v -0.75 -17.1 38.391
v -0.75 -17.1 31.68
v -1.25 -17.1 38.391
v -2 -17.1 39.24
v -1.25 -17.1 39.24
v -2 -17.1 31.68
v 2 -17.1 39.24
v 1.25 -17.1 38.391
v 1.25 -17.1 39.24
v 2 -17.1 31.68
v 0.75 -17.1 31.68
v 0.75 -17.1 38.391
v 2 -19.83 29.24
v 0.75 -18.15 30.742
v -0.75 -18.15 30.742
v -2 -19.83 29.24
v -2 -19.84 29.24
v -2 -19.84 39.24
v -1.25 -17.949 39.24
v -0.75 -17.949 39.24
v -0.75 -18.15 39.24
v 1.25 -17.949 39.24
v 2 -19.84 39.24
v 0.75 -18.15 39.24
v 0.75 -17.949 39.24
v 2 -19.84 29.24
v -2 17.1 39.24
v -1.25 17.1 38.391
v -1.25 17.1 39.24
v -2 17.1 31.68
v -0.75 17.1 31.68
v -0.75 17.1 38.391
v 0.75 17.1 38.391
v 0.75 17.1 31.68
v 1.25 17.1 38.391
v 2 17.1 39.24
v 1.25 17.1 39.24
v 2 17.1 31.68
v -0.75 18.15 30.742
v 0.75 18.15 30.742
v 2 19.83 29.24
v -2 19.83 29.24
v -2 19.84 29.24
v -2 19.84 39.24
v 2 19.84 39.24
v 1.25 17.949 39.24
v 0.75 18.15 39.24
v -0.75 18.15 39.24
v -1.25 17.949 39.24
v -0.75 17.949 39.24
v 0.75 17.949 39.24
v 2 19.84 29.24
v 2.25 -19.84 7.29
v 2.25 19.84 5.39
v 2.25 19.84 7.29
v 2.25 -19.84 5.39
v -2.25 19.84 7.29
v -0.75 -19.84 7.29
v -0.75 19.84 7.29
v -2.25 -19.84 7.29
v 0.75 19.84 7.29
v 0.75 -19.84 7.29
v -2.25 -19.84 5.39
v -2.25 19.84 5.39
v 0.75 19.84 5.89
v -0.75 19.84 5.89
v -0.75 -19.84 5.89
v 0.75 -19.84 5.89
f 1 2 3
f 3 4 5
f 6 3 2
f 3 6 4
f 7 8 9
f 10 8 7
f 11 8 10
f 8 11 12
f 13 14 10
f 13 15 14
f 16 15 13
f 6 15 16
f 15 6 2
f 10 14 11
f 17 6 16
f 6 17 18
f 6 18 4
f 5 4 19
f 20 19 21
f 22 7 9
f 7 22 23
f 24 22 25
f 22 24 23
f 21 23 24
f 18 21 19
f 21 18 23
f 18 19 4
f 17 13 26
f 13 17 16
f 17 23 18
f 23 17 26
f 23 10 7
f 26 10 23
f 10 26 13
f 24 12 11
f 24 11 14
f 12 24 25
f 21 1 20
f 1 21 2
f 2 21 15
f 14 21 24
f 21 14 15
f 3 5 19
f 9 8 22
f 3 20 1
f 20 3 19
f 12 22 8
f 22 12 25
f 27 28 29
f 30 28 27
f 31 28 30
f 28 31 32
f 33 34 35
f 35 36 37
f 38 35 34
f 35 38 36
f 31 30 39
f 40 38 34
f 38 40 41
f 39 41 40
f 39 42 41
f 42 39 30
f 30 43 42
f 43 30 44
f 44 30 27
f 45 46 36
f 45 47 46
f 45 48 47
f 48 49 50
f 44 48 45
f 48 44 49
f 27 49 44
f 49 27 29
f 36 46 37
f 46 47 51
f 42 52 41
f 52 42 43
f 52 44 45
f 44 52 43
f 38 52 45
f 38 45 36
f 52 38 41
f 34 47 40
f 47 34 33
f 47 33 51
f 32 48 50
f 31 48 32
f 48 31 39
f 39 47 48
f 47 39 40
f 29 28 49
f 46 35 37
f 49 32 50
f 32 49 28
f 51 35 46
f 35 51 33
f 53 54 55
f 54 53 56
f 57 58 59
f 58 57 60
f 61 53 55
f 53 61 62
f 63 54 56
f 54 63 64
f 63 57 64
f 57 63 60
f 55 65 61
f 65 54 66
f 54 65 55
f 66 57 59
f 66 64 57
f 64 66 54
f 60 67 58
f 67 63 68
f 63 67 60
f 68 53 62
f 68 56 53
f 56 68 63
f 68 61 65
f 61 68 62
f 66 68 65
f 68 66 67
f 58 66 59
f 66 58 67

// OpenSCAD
// The final light bin (2026-11-01): divider positions at the joints between cells only (one per cell
// boundary: a 2-wide bin takes one divider, a 3-wide two, a 1-wide none). At each joint the divider is held three ways:
// a groove down the middle of a short rib under the lip on the front and the back wall (2.4 deep, 10 tall; ),
// and a groove in a ridge on the floor's joint strip (a groove sunk into the floor does not fit: the baseplate's ridge
// sits 0.3 under the strip).
// With `flex` the bin also gets the flex-label groove (scad/flex_label.scad) in the front and side walls; the divider's
// top stays under the label.
//
// Light bin, measured on out/hex_light-2x1x6.stl (y inwards from the outer face, z up from the bin's bottom): inner wall
// face at y 1.21; the lip's bulge reaches y 2.63, so the divider's ends stay outside it (2.75) and it drops in from the
// top (the flex groove cuts the bulge away anyway). The joint strip on the floor is flat at 5.69, 4 wide, but only about 0.7 thick over the hollow between
// the base cells (the baseplate's ridge goes there), so the floor groove sits in a ridge built on top of it.
// Ribs end 6.5 below the lip top, the divider 5.6 below it: under the flex label (its groove floor at 5.25) and clear of
// the stacking line (3.74).
//
//   part = "bin":      the bin STL `bin` (cells_x x cells_y, `height` units) with ribs, floor ridges and (flex) the label groove
//   part = "divider":  a divider for a bin cells_y deep, `height` units; printed flat
//   openscad -D 'part="bin"' -D 'bin="out/hex_light-2x1x6.stl"' -D cells_x=2 -D height=6 -o final-2x1x6.stl rib_bin.scad
use <flex_label.scad>

part = "bin";
bin = "";
cells_x = 2;
cells_y = 1;
height = 6;
flex = true;         // cut the flex-label groove too
// Honeycomb per cell (2026-11-02: the ribs covered half hexes; filling them looked like a hex missing): with
// `pattern` the bin given is the plain solid light bin and the hex holes are cut here, the generator's own 1-cell panel
// (as on the side wall of a 1-deep hex bin) on every cell of every wall, so each joint gets a clear 12 mm lane for its
// rib. A half cell gets the middle column alone (the generator leaves a half-cell wall plain). Layouts measured on
// out/archive/light/hex_light-1x1x<h>.stl.
pattern = false;
joint_hex = false;   // also a hex column in the lane at each joint, as far as the rib leaves room (no, the plain lane)
tab = false;         // divider: its top up to the label's top, the end stop for a corner label (flex_label.scad
                     // tab = true; 2026-11-02: for wide bins already printed, which have no stops).
LABEL_TOP = 4.15; LABEL_IN = 16.2 + 0.5;   // flex label top below the lip top, its inner edge from the outer face (+0.5)
snap = false;        // snap groove for labels with a bead (scad/flex_label.scad; 2026-11-02: the plain labels fell out): on once tested
stops = false;       // leave a stop in the groove at each joint (corner labels, 2026-11-02): on once the test print holds

WALL = 1.21;
RIB_W = 4;           // rib width along the wall
RIB_Y = 3.65;        // rib face (from the outer face): 2.44 off the wall (slim and short). Deeper ribs (5.0,
                     //) with a 1.4 groove fused shut with the author's 0.6 nozzle; the divider holds well in these (2026-11-02)
RIB_H = 10;          // rib height, just under the lip
G_Y = 2.6;           // rib groove bottom
G_W = 1.5;           // groove width (divider + 0.3; 0.2 closes up with a 0.6 nozzle)
T = 1.2;             // divider thickness
END = 2.75;          // divider end (from the outer face): past the lip's bulge (2.63), 0.15 clear of the groove bottom
STRIP = 5.69;        // the floor's joint strip
RIDGE_W = 4.5; RIDGE_H = 1.6;   // floor ridge on the strip, its groove 1.4 deep
TOP = 7 * height + 3.74;
RIB_TOP = TOP - 6.5;
DIV_TOP = TOP - 5.6;
W = 42 * cells_x - 0.5; D = 42 * cells_y - 0.5;

function joints() = [for (j = [1 : 1 : cells_x - 1]) -21 * cells_x + 42 * j];

module rib() {
  // bottom 45 deg up from the wall (prints without support), top flat
  zb = RIB_TOP - RIB_H;
  difference() {
    hull() {
      translate([-RIB_W / 2, WALL - 0.3, zb]) cube([RIB_W, 0.01, RIB_H]);
      translate([-RIB_W / 2, RIB_Y - 0.01, zb + RIB_Y - WALL]) cube([RIB_W, 0.01, RIB_H - (RIB_Y - WALL)]);
    }
    translate([-G_W / 2, G_Y, 0]) cube([G_W, 10, TOP]);
    translate([0, RIB_Y, RIB_TOP]) rotate([45, 0, 0]) cube([G_W + 1, 1.2, 1.2], center = true);   // lead-in
  }
}

// the ridge along the joint strip, wall to wall, its groove in line with the rib grooves
module ridge() {
  difference() {
    translate([-RIDGE_W / 2, -D / 2 + WALL - 0.3, STRIP - 0.3]) cube([RIDGE_W, D - 2 * WALL + 0.6, RIDGE_H + 0.3]);
    translate([-G_W / 2, -D / 2, STRIP + 0.2]) cube([G_W, D, 10]);
  }
}

// per height: columns [x from the cell centre, row set], row set 0, row set 1 (z of the hole centres)
function layout(h) = h == 3 ? [[[-8.5, 0], [8.5, 0]], [11.65], []]
  : h == 6 ? [[[-10.5, 0], [0, 1], [10.5, 0]], [11.2, 22.15, 33.1], [16.675, 27.625]]
  : [[[-10.5, 0], [0, 1], [10.5, 0]], [11.2, 21.92, 32.65, 43.375, 54.1], [16.56, 27.29, 38.01, 48.74]];

module hex_hole(x, z) { translate([x, -1, z]) rotate([-90, 0, 0]) cylinder(r = 4.5, h = WALL + 1.05, $fn = 6); }
// the holes for one wall `n` cells long (whole cells, then a half one), wall along x, its outer face at y 0
module wall_holes(n, z_max = 1000) {
  L = layout(height); full = floor(n); x0 = -21 * n;
  for (i = [0 : 1 : full - 1], c = L[0], z = L[1 + c[1]]) hex_hole(x0 + 21 + 42 * i + c[0], z);
  if (n > full) for (z = L[1]) hex_hole(x0 + 42 * full + 10.5, z);
  // the middle column's rows in the lane, under the rib (z_max: the top of the highest hole), not with the 3U layout
  if (joint_hex && len(L[2])) for (j = [1 : 1 : full - 1], z = L[2]) if (z + 3.9 <= z_max) hex_hole(x0 + 42 * j, z);
}
module pattern_holes() {
  translate([0, -D / 2, 0]) wall_holes(cells_x, RIB_TOP - RIB_H - 1);   // 1 mm of wall under the rib
  translate([0, D / 2, 0]) mirror([0, 1, 0]) wall_holes(cells_x, RIB_TOP - RIB_H - 1);
  translate([-W / 2, 0, 0]) rotate([0, 0, -90]) wall_holes(cells_y);
  translate([W / 2, 0, 0]) rotate([0, 0, 90]) wall_holes(cells_y);
}

module bin_final() {
  difference() {
    union() {
      difference() { import(bin); if (pattern) pattern_holes(); }
      for (x = joints()) translate([x, 0, 0]) {
        translate([0, -D / 2, 0]) rib();                     // front wall
        translate([0, D / 2, 0]) mirror([0, 1, 0]) rib();    // back wall
        ridge();
      }
    }
    if (flex) translate([0, 0, TOP]) groove(W, D, [1, 1, 1, 1], stops, snap);   // all round: the same on every wall, the label goes in front or back
  }
}

// divider: a plain plate, its foot in the floor groove, the ends in the rib grooves
module divider_outline() {
  zb = STRIP + 0.3;
  // with the tab the whole top is at the label's top: a level edge (2026-11-03, a step at the front only looked odd)
  top = tab ? TOP - LABEL_TOP : DIV_TOP;
  difference() {
    translate([END, zb]) square([D - 2 * END, top - zb]);
    translate([D / 2, top]) circle(r = 7, $fn = 48);   // finger notch to lift it out
  }
}

if (part == "bin") bin_final();
if (part == "divider") linear_extrude(T) translate([-D / 2, 0]) divider_outline();   // printed flat; y along the bin's depth
